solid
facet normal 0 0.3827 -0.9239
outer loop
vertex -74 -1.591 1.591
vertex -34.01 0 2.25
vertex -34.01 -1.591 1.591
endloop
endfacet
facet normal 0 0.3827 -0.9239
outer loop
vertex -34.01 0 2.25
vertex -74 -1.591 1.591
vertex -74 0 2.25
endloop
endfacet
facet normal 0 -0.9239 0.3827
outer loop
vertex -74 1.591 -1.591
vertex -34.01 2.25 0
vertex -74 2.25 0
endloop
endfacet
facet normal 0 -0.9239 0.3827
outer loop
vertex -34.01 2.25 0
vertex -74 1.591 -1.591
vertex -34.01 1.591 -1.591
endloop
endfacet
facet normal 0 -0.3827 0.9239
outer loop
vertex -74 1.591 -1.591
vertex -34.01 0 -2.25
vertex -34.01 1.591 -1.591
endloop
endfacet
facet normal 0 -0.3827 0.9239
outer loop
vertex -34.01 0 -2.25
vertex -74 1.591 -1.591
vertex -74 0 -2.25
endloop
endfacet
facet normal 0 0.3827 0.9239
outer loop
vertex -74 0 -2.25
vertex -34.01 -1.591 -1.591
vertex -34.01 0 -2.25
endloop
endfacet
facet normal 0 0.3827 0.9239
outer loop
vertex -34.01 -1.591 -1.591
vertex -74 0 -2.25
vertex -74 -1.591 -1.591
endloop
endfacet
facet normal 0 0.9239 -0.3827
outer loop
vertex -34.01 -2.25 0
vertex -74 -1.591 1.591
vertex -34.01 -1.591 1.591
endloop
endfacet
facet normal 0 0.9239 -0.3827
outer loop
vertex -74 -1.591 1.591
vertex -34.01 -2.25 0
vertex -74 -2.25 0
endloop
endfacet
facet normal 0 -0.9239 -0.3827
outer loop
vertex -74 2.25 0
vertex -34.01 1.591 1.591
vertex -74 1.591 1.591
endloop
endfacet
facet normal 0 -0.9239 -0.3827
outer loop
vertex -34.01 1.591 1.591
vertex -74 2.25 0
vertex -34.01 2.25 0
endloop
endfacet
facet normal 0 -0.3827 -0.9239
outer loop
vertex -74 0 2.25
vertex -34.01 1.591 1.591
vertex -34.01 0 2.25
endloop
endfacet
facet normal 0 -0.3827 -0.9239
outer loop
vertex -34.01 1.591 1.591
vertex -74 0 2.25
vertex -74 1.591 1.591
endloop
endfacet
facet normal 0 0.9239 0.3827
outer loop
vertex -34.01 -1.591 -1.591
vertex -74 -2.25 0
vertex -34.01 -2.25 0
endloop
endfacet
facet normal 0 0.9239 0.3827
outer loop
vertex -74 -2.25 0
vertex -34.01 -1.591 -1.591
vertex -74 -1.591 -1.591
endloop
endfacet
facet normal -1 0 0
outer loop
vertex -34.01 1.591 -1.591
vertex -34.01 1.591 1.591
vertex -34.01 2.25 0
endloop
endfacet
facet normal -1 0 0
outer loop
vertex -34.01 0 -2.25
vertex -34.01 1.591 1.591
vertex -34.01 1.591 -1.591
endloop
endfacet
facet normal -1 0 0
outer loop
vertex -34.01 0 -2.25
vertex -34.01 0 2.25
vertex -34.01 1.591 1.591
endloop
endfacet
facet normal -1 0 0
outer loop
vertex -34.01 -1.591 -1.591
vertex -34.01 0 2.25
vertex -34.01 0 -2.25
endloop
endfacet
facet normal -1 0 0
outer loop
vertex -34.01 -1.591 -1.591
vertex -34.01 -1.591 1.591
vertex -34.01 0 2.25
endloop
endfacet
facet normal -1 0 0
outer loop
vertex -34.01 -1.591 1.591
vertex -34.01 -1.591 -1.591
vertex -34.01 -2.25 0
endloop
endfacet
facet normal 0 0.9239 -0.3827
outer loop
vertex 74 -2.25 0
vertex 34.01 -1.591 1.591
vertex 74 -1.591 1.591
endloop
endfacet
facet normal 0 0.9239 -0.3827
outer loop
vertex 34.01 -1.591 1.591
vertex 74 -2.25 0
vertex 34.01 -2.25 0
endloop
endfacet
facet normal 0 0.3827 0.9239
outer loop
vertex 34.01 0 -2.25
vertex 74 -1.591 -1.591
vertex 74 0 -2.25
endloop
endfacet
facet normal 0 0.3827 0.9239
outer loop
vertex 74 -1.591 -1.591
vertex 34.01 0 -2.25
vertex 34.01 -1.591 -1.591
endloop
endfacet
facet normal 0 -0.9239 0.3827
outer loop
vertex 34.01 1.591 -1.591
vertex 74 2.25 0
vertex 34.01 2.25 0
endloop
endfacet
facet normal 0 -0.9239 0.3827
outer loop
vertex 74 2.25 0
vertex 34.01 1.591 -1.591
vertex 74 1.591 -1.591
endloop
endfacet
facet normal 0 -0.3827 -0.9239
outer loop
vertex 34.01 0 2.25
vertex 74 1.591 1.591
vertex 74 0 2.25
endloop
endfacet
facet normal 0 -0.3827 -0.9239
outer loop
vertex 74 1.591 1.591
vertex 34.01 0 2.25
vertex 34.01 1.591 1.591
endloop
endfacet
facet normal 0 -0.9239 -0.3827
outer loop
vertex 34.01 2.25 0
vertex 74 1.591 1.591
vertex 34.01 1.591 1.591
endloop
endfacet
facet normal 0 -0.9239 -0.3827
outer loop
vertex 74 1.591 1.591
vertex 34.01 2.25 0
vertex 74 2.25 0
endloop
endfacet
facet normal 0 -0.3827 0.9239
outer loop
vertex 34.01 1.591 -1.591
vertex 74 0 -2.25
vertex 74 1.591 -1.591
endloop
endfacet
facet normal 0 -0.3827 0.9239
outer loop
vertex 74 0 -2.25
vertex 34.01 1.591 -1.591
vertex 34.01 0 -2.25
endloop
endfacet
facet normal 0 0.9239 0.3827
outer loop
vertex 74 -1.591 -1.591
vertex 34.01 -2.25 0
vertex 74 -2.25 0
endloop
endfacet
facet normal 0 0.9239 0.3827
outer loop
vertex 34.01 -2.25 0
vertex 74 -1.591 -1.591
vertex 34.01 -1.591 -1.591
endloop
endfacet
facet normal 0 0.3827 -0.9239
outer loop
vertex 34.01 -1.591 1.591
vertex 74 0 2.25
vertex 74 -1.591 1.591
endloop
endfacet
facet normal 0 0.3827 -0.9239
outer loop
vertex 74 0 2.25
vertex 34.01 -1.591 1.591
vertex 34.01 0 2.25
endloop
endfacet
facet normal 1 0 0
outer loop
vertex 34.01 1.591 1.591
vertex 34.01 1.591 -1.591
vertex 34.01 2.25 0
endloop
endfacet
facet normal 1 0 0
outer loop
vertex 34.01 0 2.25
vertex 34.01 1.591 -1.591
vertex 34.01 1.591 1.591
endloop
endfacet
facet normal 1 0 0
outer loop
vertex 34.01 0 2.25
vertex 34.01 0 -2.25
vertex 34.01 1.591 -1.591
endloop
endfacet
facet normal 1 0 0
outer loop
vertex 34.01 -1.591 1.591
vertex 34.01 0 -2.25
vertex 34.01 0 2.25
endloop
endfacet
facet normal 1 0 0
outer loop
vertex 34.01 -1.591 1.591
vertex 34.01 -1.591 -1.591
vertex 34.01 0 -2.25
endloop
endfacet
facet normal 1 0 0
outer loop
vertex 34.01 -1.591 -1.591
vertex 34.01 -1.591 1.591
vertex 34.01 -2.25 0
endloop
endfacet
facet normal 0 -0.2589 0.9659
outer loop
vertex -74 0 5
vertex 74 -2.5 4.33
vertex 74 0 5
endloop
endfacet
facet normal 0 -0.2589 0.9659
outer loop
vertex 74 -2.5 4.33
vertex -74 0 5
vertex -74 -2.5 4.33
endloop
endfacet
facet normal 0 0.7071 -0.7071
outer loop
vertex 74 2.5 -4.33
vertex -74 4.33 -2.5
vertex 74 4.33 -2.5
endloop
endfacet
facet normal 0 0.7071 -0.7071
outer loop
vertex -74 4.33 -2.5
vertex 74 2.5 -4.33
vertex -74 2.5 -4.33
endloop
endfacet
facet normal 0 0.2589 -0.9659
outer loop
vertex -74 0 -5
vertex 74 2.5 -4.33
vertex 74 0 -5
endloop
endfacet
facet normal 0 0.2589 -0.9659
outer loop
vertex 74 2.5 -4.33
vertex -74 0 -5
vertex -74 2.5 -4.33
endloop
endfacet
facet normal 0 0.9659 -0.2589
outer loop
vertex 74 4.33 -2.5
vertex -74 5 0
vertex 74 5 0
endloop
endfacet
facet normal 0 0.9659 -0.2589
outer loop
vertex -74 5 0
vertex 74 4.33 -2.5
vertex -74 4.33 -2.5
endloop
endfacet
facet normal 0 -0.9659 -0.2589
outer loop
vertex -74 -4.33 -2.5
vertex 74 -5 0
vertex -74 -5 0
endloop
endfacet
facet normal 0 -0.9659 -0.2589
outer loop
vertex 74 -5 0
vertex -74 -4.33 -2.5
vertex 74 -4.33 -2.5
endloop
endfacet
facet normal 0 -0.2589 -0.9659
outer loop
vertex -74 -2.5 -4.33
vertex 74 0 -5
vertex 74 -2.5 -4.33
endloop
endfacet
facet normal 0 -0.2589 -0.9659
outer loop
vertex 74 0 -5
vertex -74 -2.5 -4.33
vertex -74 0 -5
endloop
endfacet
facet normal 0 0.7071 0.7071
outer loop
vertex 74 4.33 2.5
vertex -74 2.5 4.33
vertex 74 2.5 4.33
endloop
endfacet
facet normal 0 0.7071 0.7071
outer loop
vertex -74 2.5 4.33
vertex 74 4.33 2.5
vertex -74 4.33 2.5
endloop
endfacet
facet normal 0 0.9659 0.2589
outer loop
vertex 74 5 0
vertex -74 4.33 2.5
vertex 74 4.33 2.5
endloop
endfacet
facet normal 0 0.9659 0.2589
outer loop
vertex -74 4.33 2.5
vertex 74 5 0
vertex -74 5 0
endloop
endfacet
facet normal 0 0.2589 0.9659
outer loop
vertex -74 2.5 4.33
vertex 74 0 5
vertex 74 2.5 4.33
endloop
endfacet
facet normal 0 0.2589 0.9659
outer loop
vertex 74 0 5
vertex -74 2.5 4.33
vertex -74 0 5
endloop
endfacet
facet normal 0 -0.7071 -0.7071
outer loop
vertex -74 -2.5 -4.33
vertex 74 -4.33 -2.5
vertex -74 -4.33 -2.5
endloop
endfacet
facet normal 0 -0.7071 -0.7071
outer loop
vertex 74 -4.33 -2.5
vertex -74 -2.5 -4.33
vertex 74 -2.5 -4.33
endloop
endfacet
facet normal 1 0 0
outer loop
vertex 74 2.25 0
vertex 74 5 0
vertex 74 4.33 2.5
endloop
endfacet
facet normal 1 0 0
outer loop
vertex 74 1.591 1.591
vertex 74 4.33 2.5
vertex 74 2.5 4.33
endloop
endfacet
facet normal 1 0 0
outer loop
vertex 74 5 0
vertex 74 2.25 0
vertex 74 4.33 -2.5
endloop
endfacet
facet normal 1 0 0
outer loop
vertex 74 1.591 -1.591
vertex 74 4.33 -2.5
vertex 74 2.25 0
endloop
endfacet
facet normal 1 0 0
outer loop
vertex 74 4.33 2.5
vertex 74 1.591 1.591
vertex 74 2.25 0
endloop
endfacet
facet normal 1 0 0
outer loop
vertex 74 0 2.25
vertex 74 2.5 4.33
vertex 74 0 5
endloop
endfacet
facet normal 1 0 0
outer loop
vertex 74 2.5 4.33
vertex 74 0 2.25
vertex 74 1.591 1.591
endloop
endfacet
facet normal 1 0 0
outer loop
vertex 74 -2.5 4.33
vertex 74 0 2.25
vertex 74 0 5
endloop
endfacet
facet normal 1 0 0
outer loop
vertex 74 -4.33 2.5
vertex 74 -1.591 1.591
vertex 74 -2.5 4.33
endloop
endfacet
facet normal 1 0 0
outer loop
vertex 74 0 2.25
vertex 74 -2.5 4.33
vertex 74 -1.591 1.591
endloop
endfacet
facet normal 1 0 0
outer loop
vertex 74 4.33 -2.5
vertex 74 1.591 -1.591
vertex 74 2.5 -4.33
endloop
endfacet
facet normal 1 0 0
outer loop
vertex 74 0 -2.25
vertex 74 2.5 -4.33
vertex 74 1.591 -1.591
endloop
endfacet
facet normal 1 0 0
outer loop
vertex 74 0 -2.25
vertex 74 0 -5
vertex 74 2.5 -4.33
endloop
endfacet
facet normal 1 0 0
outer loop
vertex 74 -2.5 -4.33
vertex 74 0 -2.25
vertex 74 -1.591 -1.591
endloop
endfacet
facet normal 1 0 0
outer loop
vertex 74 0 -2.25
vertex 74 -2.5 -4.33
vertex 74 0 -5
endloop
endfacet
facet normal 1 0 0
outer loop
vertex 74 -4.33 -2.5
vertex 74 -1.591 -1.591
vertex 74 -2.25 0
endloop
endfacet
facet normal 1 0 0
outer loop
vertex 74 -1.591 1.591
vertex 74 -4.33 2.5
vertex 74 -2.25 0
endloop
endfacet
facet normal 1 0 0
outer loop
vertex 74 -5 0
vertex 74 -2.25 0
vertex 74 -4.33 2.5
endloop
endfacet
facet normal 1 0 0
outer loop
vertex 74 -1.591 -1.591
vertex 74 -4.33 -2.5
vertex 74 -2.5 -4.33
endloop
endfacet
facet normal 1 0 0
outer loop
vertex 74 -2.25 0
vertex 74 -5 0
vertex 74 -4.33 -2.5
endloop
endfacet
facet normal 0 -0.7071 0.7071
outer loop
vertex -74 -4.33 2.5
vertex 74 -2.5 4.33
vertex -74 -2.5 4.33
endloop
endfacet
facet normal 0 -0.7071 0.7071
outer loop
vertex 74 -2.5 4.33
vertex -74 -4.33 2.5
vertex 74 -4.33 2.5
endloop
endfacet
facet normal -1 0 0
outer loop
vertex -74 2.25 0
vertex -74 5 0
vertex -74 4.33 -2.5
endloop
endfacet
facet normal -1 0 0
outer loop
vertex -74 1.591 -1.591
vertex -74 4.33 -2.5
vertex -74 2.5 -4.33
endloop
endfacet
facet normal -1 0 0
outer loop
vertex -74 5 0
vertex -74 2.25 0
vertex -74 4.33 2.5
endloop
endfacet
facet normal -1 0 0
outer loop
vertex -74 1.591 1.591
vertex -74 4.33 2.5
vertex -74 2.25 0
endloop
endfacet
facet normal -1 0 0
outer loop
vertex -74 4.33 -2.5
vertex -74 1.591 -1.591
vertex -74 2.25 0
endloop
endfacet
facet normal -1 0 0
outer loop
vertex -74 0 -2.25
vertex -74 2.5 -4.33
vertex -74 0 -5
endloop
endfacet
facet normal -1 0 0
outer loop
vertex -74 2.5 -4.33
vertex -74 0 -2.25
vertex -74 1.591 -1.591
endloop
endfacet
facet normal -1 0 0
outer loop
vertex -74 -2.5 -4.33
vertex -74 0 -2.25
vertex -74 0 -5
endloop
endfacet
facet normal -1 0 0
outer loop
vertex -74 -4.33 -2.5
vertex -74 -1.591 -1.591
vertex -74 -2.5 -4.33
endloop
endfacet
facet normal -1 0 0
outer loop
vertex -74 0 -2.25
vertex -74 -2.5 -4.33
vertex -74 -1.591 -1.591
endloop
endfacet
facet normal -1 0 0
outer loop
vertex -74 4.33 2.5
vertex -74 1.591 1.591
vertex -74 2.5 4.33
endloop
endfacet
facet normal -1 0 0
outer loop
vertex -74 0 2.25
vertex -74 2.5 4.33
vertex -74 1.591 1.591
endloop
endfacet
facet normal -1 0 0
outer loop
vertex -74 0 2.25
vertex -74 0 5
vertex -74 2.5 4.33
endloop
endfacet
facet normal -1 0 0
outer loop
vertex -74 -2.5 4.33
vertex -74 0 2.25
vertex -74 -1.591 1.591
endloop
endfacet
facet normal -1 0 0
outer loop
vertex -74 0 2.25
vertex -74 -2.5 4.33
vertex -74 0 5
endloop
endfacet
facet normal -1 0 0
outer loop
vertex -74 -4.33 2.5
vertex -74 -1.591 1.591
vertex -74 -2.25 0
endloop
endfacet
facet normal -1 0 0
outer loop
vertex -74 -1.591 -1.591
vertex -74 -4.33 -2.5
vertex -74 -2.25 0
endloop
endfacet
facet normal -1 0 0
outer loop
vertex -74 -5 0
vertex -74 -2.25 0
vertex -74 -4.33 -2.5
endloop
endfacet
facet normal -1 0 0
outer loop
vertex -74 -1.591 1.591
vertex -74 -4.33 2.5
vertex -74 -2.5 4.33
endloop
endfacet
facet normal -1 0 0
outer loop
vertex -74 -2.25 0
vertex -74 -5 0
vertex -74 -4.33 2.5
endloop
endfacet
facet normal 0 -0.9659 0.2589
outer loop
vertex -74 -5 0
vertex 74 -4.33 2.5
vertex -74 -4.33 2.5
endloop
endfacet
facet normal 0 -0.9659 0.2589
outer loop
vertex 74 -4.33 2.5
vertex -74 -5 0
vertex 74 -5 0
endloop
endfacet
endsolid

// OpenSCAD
// file: dimensions.scad
internal_width = 148;
internal_depth = 195;
internal_front_height = 114;
internal_rear_height = 156;

spacer_positions = [
  [95, 70],
  [95, 6],
  [-91, 30],
];

side_panel_thickness = 6;

bottom_panel_thickness = 6;
bottom_panel_tab_width = 30;
bottom_panel_tab_positions = [-75, 0, 75];

top_panel_thickness = 1.6;
top_panel_tab_width = 20;
top_panel_tab_positions = [-80, -27, 27, 80];

front_panel_thickness = 1.6;
front_panel_tab_width = 20;
front_panel_tab_positions = [-40, 0, 40];

function top_panel_angle() = atan((internal_rear_height - internal_front_height) / internal_depth);
function top_panel_height() = sqrt(pow(internal_depth, 2) + pow(internal_rear_height - internal_front_height, 2));
function top_panel_assembly_height() = (internal_front_height + internal_rear_height) / 2;
// main file
include <dimensions.scad>;

module Spacer3D() {
  rotate([0, 90, 0]) {
    difference() {
      // Main body
      cylinder(h = internal_width, d = 10, center = true, $fn = 12);

      // Brass insert holes
      for(a = [0, 180]) {
        rotate([0, a, 0]) {
          translate([0, 0, -(internal_width / 2) - 0.01]) {
            cylinder(h = 40, d = 4.5, $fn = 8);
          }
        }
      }
    }
  }
}

Spacer3D();
